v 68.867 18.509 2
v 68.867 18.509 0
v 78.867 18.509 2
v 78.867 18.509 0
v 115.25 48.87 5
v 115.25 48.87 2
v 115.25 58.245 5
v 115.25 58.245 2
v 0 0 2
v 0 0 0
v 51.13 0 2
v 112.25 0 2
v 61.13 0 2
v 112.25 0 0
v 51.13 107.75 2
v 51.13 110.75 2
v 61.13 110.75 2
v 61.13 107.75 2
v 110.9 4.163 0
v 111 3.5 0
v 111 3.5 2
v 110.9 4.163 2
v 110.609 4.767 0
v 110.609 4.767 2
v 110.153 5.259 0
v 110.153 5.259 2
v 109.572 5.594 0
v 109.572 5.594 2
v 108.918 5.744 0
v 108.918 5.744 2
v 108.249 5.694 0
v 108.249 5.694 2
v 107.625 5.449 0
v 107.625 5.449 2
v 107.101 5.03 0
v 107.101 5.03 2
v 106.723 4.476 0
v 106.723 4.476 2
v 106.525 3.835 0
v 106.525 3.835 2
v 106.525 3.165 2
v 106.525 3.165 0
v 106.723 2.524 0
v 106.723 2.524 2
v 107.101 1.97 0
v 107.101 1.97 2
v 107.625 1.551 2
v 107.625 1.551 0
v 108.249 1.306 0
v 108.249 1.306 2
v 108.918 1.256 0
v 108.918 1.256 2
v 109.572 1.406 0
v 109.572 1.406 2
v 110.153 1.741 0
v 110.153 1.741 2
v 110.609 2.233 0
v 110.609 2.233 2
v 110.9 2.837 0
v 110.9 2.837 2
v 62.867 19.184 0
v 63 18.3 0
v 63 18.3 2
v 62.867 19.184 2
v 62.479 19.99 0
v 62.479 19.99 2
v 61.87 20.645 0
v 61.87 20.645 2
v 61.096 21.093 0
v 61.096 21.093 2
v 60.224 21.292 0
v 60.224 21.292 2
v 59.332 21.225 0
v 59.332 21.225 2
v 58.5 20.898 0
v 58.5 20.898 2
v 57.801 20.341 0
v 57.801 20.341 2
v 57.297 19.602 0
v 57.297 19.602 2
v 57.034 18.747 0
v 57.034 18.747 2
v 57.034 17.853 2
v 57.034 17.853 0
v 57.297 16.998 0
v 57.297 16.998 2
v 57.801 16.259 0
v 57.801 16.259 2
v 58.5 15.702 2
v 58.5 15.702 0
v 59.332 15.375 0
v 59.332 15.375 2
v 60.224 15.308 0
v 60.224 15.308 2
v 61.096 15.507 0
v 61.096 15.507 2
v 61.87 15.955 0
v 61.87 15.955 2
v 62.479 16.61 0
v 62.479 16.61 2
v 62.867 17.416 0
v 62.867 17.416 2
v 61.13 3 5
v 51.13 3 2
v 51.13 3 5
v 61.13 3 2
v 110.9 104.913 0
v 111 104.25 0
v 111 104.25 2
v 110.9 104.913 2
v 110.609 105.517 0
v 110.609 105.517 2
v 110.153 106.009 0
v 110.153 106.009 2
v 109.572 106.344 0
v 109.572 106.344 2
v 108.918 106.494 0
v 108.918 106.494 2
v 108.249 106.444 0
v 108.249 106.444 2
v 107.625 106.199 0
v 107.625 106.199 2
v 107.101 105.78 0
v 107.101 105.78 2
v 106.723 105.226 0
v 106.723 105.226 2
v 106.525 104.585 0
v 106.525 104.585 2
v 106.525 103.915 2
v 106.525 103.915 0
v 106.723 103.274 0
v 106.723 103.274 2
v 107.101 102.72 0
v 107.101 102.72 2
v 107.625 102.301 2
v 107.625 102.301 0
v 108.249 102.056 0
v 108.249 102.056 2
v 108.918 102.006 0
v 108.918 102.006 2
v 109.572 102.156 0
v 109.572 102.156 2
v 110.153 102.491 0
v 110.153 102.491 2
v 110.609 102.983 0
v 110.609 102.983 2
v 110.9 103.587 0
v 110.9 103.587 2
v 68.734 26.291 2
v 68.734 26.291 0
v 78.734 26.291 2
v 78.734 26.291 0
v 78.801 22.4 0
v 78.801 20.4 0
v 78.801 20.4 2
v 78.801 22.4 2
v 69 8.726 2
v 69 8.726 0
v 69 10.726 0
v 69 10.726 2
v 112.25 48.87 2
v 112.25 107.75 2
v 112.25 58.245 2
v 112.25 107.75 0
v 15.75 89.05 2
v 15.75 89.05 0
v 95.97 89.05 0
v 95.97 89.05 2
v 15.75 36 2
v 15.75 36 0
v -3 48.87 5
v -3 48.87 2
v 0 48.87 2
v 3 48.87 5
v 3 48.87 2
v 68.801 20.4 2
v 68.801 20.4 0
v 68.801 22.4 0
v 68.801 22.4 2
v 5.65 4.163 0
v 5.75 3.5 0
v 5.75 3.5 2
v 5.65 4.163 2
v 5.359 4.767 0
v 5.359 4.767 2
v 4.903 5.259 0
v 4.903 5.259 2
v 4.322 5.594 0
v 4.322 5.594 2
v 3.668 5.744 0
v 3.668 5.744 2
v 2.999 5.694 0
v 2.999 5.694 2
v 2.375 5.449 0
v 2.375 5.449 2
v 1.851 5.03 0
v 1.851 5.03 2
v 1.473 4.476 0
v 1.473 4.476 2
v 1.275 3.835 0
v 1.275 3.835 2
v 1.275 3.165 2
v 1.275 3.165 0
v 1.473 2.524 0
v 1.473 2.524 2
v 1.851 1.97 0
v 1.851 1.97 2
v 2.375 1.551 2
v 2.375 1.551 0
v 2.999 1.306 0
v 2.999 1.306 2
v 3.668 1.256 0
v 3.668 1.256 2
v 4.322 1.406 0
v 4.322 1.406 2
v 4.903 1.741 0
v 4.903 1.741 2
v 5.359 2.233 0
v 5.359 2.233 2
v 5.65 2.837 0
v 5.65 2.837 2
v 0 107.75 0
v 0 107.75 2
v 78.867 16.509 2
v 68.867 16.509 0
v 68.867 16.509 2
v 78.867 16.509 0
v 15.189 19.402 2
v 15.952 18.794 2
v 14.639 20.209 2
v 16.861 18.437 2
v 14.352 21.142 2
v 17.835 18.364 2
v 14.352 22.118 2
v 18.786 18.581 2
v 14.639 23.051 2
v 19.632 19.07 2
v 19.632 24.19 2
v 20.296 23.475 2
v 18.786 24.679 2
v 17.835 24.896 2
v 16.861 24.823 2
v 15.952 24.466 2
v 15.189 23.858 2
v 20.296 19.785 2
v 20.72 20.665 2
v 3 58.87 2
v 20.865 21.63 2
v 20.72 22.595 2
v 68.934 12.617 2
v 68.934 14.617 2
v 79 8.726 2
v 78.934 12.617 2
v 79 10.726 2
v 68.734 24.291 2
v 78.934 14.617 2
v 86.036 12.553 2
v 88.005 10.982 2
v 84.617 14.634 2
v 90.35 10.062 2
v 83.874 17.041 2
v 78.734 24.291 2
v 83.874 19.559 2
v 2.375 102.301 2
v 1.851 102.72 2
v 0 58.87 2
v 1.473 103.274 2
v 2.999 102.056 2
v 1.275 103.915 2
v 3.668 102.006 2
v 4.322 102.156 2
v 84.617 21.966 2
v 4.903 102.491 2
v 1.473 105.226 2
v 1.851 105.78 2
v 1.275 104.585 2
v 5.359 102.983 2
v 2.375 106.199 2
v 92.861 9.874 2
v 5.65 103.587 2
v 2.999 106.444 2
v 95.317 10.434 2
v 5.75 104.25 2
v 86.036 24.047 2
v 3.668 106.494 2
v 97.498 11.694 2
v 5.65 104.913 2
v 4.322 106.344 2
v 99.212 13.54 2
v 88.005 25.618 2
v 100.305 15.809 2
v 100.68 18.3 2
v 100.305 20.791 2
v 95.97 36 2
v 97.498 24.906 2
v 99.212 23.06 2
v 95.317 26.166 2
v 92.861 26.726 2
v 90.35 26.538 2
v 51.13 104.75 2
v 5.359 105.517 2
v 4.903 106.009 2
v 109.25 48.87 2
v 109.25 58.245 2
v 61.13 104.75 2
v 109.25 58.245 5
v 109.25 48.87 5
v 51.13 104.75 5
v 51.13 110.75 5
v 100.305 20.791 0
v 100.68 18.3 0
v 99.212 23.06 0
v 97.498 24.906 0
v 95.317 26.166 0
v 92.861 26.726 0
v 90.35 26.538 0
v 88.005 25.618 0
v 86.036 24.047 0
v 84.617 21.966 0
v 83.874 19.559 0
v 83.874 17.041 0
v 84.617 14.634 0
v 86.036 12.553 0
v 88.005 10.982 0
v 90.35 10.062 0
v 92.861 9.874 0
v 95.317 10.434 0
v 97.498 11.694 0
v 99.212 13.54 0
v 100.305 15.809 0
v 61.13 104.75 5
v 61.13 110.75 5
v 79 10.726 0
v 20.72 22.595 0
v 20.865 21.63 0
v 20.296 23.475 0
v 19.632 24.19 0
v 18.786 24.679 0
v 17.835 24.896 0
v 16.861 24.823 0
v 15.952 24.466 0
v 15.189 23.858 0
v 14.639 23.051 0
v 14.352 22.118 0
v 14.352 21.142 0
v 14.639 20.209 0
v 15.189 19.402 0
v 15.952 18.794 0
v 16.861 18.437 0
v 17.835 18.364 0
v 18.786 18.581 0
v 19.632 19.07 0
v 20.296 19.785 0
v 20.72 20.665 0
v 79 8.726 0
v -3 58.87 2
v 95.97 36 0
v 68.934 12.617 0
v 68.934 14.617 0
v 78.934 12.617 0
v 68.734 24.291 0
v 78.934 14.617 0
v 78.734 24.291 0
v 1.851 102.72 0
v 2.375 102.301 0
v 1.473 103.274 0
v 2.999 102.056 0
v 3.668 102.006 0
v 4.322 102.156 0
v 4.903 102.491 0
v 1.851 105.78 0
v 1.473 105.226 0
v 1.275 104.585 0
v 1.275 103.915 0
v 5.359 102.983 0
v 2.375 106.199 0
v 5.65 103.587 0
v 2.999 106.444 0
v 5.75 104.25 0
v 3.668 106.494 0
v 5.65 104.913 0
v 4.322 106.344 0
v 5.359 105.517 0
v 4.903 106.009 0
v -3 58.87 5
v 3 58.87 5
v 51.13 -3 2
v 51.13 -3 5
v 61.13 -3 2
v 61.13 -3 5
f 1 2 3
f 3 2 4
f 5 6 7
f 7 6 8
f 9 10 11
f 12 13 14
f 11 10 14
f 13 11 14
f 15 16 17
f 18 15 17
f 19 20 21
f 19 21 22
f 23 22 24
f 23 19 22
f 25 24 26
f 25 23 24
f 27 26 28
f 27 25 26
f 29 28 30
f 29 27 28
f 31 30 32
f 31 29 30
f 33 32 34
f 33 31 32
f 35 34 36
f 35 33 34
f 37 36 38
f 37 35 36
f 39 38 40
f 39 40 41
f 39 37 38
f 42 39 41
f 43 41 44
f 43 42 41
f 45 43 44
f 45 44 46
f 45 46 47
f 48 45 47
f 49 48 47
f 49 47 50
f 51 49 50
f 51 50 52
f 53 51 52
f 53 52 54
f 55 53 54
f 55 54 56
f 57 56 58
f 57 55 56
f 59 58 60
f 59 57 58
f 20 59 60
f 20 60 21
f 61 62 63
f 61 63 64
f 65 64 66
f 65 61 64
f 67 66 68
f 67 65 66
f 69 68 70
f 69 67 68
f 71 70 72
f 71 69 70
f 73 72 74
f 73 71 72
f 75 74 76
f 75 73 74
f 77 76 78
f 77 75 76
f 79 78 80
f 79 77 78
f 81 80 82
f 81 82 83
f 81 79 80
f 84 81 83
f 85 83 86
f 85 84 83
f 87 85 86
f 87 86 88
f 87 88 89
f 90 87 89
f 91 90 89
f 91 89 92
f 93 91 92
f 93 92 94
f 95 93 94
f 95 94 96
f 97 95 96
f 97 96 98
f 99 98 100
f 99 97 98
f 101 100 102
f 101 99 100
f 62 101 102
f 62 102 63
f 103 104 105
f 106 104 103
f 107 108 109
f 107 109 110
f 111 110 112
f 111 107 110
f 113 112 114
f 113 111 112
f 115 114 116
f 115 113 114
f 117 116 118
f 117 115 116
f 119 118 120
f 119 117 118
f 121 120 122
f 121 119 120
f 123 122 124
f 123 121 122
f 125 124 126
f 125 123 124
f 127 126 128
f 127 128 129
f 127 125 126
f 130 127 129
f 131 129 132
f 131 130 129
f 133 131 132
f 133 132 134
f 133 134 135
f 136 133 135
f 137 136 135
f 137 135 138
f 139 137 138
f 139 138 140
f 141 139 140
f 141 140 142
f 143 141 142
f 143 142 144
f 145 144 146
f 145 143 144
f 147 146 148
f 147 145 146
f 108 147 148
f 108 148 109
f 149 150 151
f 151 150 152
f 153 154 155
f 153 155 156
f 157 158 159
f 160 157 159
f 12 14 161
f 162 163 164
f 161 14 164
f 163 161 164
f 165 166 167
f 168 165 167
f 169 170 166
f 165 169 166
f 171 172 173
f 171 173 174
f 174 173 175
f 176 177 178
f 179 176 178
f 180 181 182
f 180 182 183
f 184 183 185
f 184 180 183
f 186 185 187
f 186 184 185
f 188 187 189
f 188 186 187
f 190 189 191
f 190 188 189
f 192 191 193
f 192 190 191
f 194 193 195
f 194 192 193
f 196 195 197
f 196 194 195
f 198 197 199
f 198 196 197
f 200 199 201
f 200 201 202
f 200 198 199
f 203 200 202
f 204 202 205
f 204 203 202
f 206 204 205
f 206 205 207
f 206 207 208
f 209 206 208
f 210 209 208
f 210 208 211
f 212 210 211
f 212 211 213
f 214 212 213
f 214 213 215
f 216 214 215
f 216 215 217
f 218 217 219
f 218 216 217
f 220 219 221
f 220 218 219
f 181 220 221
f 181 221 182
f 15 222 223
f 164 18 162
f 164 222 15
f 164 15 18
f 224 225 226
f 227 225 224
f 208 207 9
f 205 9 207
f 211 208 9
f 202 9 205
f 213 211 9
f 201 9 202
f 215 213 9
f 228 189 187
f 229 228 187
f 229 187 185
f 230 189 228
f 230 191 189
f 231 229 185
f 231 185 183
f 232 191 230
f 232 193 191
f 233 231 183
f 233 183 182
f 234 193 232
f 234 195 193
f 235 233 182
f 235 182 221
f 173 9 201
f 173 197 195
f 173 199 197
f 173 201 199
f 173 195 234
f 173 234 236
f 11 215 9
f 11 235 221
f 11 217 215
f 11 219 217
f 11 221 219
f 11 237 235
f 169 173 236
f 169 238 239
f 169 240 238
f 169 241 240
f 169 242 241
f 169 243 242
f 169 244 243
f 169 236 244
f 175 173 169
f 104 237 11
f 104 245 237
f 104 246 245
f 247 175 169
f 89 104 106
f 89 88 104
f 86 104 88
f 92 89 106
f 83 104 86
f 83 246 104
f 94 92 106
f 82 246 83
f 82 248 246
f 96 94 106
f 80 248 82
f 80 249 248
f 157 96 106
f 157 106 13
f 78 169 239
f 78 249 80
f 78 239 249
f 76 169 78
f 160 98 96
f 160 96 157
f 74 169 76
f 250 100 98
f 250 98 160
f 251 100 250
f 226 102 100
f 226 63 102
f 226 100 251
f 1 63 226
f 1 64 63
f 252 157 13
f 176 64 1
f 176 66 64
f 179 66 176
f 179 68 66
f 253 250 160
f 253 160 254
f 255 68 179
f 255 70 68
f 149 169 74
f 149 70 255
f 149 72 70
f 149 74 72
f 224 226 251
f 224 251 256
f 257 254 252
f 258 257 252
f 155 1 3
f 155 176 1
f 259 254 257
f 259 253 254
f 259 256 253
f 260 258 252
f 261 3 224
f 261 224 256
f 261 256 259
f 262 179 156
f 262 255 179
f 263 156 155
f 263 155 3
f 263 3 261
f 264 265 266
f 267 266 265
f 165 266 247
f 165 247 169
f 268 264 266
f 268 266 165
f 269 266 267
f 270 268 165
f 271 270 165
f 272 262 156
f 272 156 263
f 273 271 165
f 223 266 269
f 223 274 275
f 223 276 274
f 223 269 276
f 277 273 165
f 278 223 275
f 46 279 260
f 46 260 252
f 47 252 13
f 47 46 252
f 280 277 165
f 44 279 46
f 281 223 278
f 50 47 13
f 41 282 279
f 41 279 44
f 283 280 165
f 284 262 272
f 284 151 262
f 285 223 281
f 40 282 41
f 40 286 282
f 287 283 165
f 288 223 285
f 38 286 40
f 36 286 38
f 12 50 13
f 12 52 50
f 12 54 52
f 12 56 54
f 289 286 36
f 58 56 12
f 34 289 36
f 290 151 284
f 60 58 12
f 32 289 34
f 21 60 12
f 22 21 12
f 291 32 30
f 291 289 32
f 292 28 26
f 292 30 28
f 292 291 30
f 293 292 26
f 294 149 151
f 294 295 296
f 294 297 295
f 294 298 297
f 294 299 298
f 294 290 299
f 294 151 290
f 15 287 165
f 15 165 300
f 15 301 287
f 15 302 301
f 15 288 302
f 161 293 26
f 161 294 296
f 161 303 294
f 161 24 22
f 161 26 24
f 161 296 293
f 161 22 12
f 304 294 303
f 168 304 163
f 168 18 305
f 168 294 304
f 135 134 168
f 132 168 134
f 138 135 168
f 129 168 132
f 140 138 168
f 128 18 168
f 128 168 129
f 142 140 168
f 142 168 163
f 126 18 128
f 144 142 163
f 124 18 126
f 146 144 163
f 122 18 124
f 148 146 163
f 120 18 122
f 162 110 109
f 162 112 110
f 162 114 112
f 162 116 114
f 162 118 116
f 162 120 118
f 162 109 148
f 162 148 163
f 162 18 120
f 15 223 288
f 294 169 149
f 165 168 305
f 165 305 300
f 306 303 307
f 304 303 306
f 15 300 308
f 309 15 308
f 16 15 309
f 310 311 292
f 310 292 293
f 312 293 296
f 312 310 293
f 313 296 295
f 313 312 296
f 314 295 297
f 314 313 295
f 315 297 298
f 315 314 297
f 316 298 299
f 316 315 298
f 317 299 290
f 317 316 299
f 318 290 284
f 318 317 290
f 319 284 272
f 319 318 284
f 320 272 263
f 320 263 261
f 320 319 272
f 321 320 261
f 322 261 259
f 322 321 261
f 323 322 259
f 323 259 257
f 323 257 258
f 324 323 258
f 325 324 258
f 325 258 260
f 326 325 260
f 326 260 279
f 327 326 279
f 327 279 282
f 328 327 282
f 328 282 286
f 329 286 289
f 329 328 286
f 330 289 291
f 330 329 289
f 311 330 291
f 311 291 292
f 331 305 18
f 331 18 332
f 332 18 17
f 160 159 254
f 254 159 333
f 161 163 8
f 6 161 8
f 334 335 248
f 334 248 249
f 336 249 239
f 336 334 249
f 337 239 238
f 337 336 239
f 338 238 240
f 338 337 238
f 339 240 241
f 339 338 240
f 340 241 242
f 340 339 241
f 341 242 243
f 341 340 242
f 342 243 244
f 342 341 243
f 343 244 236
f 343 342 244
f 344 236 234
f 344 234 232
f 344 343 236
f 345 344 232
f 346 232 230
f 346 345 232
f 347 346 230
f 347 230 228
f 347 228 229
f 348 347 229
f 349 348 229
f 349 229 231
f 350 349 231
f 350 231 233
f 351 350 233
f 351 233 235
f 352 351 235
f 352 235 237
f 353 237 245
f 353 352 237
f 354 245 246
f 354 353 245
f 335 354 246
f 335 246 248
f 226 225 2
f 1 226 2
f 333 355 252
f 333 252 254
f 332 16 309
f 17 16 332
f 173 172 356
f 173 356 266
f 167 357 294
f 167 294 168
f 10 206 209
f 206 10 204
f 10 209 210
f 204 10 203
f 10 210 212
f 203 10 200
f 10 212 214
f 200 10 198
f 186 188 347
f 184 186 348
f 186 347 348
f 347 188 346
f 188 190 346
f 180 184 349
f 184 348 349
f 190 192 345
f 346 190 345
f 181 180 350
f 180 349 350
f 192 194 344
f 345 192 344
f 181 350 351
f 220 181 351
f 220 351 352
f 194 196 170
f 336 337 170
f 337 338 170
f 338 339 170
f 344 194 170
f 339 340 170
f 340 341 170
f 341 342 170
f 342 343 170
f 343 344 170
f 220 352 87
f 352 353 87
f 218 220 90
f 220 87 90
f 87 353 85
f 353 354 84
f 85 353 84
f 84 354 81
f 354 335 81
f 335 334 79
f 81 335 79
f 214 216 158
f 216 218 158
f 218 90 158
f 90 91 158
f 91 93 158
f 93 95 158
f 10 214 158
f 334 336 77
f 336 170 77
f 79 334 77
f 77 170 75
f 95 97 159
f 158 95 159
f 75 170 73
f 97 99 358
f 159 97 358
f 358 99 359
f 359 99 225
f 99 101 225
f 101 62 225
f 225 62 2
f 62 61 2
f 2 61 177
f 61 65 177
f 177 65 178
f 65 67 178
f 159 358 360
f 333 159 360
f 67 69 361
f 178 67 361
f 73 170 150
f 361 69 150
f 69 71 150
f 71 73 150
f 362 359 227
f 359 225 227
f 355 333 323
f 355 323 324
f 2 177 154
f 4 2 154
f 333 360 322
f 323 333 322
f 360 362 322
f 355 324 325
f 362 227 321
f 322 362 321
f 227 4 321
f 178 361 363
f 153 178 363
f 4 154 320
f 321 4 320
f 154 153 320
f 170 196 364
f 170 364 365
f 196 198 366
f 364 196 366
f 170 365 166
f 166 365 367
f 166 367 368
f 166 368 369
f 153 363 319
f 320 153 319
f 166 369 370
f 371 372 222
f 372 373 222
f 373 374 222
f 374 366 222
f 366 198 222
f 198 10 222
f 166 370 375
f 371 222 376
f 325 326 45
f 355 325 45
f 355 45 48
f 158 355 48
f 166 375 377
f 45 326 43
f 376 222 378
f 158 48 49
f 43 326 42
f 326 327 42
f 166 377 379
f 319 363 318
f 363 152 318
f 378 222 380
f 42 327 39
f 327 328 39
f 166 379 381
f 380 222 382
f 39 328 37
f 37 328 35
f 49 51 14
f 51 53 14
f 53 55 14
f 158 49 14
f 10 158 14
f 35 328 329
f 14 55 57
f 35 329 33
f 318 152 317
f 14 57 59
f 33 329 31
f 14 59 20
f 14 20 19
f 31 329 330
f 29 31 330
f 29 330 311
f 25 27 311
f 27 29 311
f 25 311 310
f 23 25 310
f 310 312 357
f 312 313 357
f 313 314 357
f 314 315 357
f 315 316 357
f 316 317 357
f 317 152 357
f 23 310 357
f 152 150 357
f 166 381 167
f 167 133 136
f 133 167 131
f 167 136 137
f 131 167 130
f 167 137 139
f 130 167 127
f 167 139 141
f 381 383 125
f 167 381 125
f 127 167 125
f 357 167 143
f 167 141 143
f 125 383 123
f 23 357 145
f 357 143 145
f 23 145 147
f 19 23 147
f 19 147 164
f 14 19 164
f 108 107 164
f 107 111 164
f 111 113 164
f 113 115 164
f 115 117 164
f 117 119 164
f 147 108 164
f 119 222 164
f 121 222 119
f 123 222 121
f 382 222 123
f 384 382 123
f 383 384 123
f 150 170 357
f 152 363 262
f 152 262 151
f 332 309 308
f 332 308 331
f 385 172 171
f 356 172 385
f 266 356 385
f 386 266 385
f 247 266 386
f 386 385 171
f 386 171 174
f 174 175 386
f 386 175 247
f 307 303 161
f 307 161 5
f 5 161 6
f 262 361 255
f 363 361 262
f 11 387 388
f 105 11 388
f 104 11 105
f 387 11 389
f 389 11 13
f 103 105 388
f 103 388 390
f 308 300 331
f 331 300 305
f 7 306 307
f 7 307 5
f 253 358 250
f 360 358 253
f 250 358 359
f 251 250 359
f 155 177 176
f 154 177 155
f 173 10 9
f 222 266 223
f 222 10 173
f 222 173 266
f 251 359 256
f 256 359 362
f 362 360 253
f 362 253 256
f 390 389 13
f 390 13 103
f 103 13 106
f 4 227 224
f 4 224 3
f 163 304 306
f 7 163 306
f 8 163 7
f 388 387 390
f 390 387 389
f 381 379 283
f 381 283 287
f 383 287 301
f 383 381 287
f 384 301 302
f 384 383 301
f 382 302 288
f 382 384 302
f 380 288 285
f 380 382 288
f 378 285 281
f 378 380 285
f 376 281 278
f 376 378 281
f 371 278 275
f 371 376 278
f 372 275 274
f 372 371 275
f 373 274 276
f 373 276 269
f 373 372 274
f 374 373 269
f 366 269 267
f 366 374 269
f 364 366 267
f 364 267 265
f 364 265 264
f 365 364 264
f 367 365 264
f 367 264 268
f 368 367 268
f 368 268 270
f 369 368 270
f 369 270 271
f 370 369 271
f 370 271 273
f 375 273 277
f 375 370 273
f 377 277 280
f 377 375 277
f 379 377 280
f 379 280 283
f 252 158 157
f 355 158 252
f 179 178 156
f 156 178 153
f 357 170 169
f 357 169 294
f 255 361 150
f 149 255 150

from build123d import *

# Parameters (mm, degrees)
F0_W     = 112.25
F0_H     = 107.75
F0_R     = 2.25
F0_R_2   = 3.275
F0_W_2   = 10
F0_H_2   = 2
F0_R_3   = 3
F0_R_4   = 8.45
F0_W_3   = 80.22
F0_H_3   = 53.05
F1_DEPTH = 2
F2_W     = 6
F2_H     = 9.375001
F2_H_2   = 10
F2_W_2   = 10
F2_H_3   = 6
F3_DEPTH = 3


with BuildPart() as f1:
    # F0 (on Top) → F1 (new body)
    with BuildSketch(Plane.XY):
        with Locations((56.125, 53.875)):
            Rectangle(F0_W, F0_H)
        with Locations((3.5, 3.5)):
            Circle(F0_R, mode=Mode.SUBTRACT)
        with Locations((17.59, 21.63)):
            Circle(F0_R_2, mode=Mode.SUBTRACT)
        with Locations((74, 9.726001)):
            Rectangle(F0_W_2, F0_H_2, mode=Mode.SUBTRACT)
        with Locations((60, 18.3)):
            Circle(F0_R_3, mode=Mode.SUBTRACT)
        with Locations((73.933571, 13.617334)):
            Rectangle(F0_W_2, F0_H_2, mode=Mode.SUBTRACT)
        with Locations((73.867143, 17.508667)):
            Rectangle(F0_W_2, F0_H_2, mode=Mode.SUBTRACT)
        with Locations((73.800714, 21.4)):
            Rectangle(F0_W_2, F0_H_2, mode=Mode.SUBTRACT)
        with Locations((73.734285, 25.291333)):
            Rectangle(F0_W_2, F0_H_2, mode=Mode.SUBTRACT)
        with Locations((108.75, 3.5)):
            Circle(F0_R, mode=Mode.SUBTRACT)
        with Locations((92.23, 18.3)):
            Circle(F0_R_4, mode=Mode.SUBTRACT)
        with Locations((55.86, 62.525)):
            Rectangle(F0_W_3, F0_H_3, mode=Mode.SUBTRACT)
        with Locations((3.5, 104.25)):
            Circle(F0_R, mode=Mode.SUBTRACT)
        with Locations((108.75, 104.25)):
            Circle(F0_R, mode=Mode.SUBTRACT)
    extrude(amount=F1_DEPTH)

    # F2 (on face) → F3 (join)
    with BuildSketch(Plane.XY.offset(2)):
        with Locations((112.25, 53.5575)):
            Rectangle(F2_W, F2_H)
        with Locations((0, 53.87)):
            Rectangle(F2_W, F2_H_2)
        with Locations((56.13, 107.75)):
            Rectangle(F2_W_2, F2_H_3)
        with Locations((56.13, 0)):
            Rectangle(F2_W_2, F2_H_3)
    extrude(amount=F3_DEPTH)


solid = f1.part
